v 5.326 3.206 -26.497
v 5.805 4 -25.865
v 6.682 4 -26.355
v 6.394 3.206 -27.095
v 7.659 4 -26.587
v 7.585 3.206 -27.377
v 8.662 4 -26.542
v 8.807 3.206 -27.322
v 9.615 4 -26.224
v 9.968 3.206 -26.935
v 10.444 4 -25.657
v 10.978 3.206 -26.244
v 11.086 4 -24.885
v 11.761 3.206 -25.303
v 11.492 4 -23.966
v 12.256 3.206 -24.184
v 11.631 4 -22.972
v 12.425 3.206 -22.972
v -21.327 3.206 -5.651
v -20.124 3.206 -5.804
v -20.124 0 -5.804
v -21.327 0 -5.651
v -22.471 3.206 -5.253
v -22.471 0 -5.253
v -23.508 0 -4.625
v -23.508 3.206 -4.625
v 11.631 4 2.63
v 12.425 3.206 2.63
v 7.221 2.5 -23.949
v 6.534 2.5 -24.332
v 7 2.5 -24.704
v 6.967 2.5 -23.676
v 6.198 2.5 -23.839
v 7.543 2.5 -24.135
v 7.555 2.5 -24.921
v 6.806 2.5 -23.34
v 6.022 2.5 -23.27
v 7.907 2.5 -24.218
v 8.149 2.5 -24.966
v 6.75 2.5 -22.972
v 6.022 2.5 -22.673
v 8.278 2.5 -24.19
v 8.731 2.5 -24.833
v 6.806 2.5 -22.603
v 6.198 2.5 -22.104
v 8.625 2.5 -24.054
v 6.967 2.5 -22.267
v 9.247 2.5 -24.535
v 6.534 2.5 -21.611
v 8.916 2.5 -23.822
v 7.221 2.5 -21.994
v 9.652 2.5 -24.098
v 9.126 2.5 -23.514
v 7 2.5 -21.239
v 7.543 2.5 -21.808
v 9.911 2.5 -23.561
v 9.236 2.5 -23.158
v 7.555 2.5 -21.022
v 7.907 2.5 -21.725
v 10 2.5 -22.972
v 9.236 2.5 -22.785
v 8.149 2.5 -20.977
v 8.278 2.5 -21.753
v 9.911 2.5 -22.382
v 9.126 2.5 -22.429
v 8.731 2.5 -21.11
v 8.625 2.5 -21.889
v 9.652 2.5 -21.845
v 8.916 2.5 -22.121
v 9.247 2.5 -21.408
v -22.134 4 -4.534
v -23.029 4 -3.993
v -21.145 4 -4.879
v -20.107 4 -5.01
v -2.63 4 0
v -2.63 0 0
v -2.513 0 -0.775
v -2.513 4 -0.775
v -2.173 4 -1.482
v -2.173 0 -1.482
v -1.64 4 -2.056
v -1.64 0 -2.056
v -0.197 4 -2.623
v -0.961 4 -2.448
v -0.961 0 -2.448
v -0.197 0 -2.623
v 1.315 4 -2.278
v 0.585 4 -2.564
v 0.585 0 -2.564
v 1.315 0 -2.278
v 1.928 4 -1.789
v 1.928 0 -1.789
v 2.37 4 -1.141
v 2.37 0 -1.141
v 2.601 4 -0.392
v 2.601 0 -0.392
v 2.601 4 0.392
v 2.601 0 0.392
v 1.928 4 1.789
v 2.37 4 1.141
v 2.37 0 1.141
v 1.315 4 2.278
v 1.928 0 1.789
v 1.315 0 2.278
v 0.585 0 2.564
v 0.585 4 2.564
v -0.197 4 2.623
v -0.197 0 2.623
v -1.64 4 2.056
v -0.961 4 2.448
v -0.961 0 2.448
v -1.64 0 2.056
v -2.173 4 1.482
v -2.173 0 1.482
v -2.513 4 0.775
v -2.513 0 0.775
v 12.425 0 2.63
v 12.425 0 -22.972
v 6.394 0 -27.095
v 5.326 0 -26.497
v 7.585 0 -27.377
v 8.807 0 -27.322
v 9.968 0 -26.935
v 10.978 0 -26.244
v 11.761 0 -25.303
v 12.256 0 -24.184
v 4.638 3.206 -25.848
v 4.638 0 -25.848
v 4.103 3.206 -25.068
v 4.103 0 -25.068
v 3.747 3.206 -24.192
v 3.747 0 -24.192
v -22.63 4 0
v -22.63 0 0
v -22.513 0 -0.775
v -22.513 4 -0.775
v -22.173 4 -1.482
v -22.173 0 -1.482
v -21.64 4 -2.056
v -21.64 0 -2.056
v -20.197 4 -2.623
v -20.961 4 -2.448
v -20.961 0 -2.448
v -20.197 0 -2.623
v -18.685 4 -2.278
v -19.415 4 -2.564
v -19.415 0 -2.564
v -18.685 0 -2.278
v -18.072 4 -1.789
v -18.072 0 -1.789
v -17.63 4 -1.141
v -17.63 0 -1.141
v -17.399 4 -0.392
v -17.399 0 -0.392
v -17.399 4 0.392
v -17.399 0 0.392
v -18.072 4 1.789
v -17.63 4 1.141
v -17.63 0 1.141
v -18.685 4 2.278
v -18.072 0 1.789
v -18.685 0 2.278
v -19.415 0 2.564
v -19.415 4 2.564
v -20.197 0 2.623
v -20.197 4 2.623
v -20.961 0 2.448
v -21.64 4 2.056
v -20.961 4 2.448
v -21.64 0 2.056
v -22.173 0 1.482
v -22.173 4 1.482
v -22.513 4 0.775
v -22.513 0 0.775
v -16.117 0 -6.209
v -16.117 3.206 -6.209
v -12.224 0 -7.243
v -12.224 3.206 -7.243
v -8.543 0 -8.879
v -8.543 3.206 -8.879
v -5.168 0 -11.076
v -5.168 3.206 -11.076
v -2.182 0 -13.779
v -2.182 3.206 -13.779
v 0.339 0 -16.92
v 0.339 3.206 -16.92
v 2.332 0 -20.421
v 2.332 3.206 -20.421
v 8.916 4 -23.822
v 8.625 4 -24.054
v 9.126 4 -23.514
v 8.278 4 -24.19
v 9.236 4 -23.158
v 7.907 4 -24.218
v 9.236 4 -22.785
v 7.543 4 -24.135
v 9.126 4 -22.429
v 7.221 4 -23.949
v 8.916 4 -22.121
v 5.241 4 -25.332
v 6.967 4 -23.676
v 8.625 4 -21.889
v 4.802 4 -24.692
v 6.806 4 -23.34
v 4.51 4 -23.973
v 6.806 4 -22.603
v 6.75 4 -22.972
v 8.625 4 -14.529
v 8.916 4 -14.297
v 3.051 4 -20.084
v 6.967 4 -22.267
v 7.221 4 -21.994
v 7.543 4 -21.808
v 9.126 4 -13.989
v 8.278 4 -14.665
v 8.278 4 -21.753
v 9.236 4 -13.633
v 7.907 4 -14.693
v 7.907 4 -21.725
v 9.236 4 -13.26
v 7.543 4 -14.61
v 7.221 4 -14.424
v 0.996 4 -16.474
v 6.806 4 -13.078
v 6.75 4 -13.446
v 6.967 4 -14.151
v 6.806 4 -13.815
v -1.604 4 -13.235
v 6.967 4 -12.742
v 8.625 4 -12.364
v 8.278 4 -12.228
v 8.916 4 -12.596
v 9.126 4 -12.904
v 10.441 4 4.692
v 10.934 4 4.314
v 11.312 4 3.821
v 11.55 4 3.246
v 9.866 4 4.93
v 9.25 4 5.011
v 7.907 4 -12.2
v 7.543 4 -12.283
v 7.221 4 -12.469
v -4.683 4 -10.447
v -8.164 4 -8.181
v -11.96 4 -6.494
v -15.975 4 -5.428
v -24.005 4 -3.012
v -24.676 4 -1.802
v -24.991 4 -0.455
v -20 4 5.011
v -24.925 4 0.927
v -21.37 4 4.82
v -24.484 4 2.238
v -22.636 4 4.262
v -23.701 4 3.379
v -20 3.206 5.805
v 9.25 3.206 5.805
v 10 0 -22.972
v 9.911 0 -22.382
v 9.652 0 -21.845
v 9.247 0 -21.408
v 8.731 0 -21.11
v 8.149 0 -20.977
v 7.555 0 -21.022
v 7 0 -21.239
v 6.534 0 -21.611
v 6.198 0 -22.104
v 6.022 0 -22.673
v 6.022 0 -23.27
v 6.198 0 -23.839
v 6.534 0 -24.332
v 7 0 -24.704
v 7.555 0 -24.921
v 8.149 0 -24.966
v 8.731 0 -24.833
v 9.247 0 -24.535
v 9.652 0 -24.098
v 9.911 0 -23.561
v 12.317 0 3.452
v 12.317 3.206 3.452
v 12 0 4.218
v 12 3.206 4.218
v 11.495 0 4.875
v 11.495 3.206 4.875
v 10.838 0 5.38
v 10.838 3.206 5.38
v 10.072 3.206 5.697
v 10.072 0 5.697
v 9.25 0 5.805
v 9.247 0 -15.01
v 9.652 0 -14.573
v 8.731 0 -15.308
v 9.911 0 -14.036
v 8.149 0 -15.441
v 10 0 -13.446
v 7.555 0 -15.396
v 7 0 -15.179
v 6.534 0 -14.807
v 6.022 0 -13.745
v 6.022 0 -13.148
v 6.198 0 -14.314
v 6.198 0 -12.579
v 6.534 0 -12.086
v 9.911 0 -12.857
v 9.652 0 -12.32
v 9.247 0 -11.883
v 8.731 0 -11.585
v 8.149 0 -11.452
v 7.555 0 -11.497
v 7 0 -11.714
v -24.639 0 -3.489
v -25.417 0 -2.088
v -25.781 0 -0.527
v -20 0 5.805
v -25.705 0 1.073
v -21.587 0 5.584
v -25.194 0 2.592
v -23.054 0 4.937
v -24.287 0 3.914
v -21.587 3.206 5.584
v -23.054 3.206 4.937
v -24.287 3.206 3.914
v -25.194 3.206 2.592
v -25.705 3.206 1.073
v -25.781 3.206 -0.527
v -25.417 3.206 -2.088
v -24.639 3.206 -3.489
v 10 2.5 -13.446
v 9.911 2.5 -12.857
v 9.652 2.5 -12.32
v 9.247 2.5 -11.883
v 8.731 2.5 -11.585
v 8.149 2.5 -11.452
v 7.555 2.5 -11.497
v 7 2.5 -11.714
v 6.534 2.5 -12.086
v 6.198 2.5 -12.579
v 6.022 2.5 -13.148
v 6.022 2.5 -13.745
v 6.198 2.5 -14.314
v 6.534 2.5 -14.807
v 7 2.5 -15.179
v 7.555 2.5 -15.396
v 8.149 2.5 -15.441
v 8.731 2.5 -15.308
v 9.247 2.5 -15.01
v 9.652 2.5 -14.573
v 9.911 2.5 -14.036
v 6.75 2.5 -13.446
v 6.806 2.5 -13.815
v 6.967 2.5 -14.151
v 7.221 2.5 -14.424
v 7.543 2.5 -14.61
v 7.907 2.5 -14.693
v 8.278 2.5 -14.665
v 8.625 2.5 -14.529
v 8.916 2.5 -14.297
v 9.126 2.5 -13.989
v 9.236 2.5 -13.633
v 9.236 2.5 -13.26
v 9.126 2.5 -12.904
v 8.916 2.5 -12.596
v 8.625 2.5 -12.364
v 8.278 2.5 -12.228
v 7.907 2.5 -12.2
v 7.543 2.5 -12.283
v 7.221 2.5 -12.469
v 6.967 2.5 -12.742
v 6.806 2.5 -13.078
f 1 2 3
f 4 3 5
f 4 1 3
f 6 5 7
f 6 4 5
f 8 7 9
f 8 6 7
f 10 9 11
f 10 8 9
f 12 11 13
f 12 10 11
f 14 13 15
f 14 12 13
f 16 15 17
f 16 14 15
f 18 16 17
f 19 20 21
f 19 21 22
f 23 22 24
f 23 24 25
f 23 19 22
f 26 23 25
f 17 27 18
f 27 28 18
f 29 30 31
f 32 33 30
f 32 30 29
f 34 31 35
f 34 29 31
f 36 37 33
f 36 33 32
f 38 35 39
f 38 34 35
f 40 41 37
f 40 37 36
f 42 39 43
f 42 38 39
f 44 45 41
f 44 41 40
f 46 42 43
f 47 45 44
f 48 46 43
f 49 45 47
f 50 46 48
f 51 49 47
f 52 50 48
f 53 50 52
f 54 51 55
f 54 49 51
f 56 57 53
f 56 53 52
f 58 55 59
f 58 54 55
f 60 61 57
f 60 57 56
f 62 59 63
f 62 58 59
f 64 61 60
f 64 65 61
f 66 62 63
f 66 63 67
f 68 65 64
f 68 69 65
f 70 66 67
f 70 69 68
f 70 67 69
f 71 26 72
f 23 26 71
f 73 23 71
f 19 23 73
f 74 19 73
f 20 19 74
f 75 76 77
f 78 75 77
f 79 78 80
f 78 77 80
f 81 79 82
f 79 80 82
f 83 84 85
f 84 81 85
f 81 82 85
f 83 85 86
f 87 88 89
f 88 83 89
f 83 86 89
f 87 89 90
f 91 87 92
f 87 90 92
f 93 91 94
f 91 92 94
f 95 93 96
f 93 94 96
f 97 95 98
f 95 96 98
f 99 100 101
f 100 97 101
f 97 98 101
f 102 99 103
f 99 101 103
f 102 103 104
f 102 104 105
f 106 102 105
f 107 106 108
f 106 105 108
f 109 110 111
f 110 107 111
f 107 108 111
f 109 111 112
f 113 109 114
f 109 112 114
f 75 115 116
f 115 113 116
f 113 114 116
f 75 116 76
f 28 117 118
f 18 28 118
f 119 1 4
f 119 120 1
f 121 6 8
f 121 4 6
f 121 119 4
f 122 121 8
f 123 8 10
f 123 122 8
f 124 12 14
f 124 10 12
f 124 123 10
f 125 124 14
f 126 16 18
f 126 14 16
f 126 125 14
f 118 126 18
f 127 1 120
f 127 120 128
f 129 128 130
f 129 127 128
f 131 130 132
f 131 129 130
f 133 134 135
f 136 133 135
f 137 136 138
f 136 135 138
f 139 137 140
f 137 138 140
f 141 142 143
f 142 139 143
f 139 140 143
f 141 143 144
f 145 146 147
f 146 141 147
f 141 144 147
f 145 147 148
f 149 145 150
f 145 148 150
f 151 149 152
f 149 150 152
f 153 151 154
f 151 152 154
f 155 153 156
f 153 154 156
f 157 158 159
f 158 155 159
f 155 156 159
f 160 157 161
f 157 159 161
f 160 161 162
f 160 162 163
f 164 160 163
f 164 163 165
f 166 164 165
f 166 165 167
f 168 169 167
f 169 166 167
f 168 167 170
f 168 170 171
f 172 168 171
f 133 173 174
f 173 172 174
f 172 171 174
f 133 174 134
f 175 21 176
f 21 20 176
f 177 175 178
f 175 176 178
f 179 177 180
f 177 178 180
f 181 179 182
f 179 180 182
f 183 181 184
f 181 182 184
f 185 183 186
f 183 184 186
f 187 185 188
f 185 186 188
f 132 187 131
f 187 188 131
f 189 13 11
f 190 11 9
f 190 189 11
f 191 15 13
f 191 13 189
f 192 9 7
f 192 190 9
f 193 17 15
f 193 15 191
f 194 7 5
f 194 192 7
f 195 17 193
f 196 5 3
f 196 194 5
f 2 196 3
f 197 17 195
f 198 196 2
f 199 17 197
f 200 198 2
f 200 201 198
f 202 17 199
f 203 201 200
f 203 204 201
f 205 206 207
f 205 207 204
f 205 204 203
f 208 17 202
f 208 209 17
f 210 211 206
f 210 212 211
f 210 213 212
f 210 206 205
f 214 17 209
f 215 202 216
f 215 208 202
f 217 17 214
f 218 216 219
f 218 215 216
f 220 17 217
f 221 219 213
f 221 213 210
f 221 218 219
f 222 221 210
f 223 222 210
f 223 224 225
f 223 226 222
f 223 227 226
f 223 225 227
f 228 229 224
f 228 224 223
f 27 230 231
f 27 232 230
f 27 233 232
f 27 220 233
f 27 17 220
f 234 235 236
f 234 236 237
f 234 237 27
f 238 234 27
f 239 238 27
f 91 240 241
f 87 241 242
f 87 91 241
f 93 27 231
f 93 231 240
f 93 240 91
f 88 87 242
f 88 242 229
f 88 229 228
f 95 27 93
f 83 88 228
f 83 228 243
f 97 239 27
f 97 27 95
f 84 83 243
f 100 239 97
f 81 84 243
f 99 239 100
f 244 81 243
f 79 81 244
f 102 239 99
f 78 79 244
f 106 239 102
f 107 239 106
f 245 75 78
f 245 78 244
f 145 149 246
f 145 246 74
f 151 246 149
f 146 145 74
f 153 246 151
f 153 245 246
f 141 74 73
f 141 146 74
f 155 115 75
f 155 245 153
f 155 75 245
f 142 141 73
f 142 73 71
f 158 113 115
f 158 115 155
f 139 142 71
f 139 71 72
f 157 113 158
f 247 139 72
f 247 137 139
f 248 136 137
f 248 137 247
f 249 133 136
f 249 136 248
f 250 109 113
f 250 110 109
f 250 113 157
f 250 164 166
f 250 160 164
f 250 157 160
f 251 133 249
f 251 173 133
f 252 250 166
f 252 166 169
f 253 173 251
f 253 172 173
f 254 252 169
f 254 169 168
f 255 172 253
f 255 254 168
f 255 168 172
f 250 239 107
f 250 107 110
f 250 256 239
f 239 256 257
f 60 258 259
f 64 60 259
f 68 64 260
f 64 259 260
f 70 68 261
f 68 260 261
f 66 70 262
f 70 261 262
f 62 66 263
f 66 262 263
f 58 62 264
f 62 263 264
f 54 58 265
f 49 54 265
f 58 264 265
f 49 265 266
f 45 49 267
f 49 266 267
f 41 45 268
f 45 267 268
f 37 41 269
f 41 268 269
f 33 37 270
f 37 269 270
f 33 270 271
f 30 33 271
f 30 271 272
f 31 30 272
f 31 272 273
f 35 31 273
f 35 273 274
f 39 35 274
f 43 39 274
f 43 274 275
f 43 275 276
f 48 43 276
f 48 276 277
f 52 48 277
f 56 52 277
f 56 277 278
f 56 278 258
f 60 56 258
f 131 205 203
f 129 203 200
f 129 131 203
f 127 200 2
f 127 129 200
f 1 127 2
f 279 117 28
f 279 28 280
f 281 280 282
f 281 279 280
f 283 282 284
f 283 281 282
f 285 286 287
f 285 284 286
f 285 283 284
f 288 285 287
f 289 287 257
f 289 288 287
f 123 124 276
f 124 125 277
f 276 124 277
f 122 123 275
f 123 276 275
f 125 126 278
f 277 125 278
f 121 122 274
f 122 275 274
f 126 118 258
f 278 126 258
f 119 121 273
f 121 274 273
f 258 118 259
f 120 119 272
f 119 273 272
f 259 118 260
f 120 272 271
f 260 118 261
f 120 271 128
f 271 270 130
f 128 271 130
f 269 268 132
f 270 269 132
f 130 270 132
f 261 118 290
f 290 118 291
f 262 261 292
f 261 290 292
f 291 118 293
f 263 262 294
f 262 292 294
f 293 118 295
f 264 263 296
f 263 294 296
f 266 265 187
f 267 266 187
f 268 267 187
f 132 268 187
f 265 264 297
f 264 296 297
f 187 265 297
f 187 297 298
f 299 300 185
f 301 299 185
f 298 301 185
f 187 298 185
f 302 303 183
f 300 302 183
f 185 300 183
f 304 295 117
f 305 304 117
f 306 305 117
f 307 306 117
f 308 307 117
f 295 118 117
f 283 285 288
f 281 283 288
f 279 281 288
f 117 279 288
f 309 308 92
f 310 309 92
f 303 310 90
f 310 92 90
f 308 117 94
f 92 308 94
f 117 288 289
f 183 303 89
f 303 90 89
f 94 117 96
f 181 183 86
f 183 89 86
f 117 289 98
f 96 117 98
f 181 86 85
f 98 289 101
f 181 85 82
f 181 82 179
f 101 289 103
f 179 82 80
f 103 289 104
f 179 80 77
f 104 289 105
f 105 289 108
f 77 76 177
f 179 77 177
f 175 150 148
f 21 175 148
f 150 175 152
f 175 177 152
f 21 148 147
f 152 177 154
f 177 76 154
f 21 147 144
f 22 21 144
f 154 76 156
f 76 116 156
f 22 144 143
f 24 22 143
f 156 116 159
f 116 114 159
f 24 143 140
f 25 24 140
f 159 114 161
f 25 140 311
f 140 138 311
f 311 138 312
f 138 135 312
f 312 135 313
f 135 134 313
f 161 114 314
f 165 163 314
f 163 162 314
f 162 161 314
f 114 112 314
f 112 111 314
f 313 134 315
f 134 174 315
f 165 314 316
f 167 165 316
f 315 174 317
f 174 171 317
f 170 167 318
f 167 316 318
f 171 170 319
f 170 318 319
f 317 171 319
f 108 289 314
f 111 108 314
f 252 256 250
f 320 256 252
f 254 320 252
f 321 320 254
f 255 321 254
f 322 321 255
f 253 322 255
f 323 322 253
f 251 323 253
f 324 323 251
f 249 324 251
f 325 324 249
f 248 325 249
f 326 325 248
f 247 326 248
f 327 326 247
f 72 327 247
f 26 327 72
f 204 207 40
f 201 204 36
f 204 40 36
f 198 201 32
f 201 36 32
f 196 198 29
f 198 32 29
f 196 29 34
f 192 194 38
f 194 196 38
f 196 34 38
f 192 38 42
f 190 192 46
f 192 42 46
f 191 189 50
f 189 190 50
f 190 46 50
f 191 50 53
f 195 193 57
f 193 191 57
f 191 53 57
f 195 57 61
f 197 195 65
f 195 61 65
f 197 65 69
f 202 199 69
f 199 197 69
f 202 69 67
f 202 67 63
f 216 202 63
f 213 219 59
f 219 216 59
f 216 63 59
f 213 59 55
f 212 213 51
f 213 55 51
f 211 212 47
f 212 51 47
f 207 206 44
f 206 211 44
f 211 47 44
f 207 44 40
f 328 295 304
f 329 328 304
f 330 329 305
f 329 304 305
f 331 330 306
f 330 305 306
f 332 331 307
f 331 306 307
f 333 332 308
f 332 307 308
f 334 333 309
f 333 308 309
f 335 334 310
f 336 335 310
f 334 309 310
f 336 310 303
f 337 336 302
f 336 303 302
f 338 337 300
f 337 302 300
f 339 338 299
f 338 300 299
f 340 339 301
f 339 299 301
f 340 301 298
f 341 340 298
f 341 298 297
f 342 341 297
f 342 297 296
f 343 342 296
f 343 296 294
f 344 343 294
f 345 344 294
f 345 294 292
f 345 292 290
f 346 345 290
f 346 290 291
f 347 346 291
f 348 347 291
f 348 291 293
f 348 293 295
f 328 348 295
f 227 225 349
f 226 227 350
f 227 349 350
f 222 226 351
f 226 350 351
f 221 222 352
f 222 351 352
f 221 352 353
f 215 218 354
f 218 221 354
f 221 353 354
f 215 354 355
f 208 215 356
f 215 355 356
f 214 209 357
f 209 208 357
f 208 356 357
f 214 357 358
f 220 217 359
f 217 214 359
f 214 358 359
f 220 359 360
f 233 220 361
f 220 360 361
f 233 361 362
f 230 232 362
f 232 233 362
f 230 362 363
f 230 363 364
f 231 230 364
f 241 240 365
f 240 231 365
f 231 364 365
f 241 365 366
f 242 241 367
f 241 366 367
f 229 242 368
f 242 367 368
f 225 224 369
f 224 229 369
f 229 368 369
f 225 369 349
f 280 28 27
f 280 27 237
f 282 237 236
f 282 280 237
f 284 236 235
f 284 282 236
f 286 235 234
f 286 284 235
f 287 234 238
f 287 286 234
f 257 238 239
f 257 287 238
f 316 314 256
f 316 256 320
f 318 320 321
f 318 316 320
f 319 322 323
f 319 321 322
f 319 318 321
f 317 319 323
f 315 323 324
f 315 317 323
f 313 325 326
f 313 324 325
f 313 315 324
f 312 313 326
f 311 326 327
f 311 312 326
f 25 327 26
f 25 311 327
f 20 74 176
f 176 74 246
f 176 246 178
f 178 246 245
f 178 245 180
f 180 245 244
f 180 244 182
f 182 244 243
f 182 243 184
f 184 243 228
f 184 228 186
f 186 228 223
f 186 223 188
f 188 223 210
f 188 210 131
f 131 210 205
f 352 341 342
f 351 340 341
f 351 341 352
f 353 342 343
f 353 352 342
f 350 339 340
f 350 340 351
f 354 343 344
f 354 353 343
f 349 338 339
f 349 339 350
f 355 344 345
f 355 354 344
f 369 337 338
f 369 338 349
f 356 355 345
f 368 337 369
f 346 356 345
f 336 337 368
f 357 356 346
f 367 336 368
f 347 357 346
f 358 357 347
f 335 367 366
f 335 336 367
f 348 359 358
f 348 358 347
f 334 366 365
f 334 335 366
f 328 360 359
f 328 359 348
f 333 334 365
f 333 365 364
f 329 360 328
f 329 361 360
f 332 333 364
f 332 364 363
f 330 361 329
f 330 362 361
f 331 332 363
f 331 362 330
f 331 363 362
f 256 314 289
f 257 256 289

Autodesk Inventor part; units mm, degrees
ref_plane "YZ Plane" through (0, 0, 0) normal (1, 0, 0) x (0, 1, 0)
ref_plane "XZ Plane" through (0, 0, 0) normal (0, 1, 0) x (-1, 0, 0)
ref_plane "XY Plane" through (0, 0, 0) normal (0, 0, 1) x (1, 0, 0)
sketch "Sketch1" plane through (0, 0, 0) normal (0, 1, 0) x (-1, 0, 0)
  circle A0 centre (0, 0) radius 2.63
  circle A1 centre (20, 0) radius 2.63
  circle A2 centre (-8, -13.4465) radius 1.25
  circle A3 centre (-8, -22.9715) radius 1.25
  circle A4 centre (20, 0) radius 5.805 construction
  circle A5 centre (0, 0) radius 5.805 construction
  circle A6 centre (-8, -13.4465) radius 4.425 construction
  circle A7 centre (-8, -22.9715) radius 4.425 construction
  line L0 (20, 5.805) -> (-9.25, 5.805)
  line L1 (-12.425, 2.63) -> (-12.425, -22.9715)
  line L2 (23.5083, -4.625) -> (-5.3257, -26.497)
  arc A8 (23.5083, -4.625) -> (20, 5.805) centre (20, 0) ccw
  arc A9 (-12.425, -22.9715) -> (-5.3257, -26.497) centre (-8, -22.9715) ccw
  arc A10 (-9.25, 5.805) -> (-12.425, 2.63) centre (-9.25, 2.63) ccw
  point P0 (0, 10)
  dimension "d0" = 5.26
  dimension "d1" = 20
  dimension "d2" = 2.5
  dimension "d3" = 10
  dimension "d4" = 13.4465
  dimension "d5" = 8
  dimension "d6" = 9.525
  dimension "d7" = 3.175
  dimension "d8" = 3.175
  dimension "d9" = 3.175
extrude "Extrusion1" add sketch "Sketch1" along normal blind 4
sketch "Sketch2" plane through (0, 0, 0) normal (0, -1, 0) x (1, 0, 0)
  circle A0 centre (8, -13.4465) radius 1.25 projected
  circle A1 centre (8, -22.9715) radius 1.25 projected
  circle A2 centre (8, -13.4465) radius 2
  circle A3 centre (8, -22.9715) radius 2
  point P0 (0, 0)
  dimension "d12" = 4
extrude "Extrusion2" cut sketch "Sketch2" against normal blind 2.5
sketch "Sketch3" plane through (0, 4, 0) normal (0, 1, 0) x (1, 0, 0)
  circle A0 centre (-20, 0) radius 2.63 projected
  circle A1 centre (8, 22.9715) radius 1.25 projected
  circle A2 centre (-20, 0) radius 5.805 construction
  circle A3 centre (8, 22.9715) radius 4.425 construction
  arc A4 (-23.5083, 4.625) -> (-20, -5.805) centre (-20, 0) ccw projected
  arc A5 (12.425, 22.9715) -> (5.3257, 26.497) centre (8, 22.9715) ccw projected
  circle A6 centre (0, 0) radius 5.805 construction
  circle A7 centre (8, 13.4465) radius 1.25 construction
  circle A8 centre (8, 13.4465) radius 4.425 construction
  arc A9 (-20.1243, 5.8037) -> (3.7466, 24.192) centre (-20.6681, 31.1978) ccw
  arc A10 (-20.1243, 5.8037) -> (-23.5083, 4.625) centre (-20, 0) ccw
  arc A11 (5.3257, 26.497) -> (3.7466, 24.192) centre (8, 22.9715) ccw
  line L0 (5.3257, 26.497) -> (-23.5083, 4.625) projected
  dimension "d15" = 25.4
extrude "Extrusion3" cut sketch "Sketch3" against normal through all contours A10 L0 A11 A9
chamfer "Chamfer1" distance 0.7937 angle 45 6 edges at (12.425, 4, -10.1707) (8.6163, 4, -27.3534) (-5.1676, 4, -11.0758) (-25.8047, 4, 0.0621) (-5.375, 4, 5.805) (11.4951, 4, 4.8751)
properties part number "CNC-021-ZAxisLimitSwitchMount" material "ABS Plastic"
